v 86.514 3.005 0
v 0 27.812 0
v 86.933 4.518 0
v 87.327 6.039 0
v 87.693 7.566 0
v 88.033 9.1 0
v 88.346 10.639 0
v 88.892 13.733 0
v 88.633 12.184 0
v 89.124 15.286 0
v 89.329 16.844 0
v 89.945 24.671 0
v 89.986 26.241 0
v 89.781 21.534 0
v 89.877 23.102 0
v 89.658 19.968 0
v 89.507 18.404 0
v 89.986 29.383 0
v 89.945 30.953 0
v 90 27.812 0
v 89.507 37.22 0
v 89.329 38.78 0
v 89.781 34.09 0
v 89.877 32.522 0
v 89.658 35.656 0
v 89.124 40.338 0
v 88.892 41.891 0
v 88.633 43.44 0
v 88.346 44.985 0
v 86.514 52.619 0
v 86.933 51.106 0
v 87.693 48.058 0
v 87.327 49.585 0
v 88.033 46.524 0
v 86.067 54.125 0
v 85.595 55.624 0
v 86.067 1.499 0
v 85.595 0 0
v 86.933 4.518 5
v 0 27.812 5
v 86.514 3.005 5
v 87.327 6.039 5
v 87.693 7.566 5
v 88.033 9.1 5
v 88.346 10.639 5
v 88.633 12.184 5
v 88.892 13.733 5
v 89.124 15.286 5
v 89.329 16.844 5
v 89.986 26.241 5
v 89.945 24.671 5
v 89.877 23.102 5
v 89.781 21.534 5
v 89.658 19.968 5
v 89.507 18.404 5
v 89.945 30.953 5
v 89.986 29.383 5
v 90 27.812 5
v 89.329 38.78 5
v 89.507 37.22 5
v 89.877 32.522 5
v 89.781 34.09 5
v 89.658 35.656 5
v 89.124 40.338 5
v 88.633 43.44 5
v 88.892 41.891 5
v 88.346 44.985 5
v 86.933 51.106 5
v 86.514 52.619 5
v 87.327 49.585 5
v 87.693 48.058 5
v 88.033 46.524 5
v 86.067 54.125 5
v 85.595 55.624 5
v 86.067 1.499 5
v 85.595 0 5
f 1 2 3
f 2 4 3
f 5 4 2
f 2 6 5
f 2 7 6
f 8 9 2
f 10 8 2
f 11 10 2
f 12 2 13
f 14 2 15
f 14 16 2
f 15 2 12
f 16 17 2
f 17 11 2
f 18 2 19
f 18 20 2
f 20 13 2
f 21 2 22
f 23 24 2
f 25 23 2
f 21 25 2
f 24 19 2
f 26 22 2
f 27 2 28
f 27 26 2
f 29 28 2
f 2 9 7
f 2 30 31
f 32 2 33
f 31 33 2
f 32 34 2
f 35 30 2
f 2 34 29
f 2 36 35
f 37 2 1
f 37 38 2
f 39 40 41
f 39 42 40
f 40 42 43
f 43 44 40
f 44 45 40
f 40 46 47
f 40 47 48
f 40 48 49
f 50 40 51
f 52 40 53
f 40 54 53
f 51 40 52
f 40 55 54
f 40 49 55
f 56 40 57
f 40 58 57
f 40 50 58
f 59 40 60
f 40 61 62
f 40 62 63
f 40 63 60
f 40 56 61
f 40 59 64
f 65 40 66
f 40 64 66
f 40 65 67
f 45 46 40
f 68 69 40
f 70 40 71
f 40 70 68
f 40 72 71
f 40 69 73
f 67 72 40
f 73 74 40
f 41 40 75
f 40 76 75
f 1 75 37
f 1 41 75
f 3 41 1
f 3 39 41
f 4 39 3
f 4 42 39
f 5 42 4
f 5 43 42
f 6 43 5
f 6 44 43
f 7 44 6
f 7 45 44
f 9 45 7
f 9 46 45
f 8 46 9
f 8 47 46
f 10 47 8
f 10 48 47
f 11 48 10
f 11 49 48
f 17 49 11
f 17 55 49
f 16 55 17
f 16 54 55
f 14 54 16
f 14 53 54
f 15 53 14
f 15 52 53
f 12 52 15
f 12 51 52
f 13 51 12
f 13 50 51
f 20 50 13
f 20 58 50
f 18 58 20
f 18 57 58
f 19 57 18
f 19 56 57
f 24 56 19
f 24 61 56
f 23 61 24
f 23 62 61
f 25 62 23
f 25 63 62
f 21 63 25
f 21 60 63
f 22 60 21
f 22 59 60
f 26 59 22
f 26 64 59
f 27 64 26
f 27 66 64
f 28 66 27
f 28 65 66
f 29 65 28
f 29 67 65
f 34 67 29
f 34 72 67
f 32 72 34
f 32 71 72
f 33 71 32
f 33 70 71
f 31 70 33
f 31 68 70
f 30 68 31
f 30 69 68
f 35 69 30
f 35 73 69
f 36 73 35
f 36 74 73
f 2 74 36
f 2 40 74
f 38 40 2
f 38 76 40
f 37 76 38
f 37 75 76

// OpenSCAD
$fn = 32;

// ----------------------------------------------------------------------
// Arc profile plate: sector, 38 points
// ----------------------------------------------------------------------

// --- parameters (mm) ---
sector_angle = 36;        // sector angle, degrees
sector_r = 90;            // outer radius
arc_step = 1;             // sampling step of the arc, degrees
plate_t = 5;              // plate thickness, Z

bbox_x = 2 * sector_r * sin(sector_angle / 2);  // chord of the sector
bbox_y = sector_r;  // depth of the sector (apex to arc)

profile = [[85.595, 0], [86.067, 1.499], [86.514, 3.005], [86.933, 4.518], [87.327, 6.039], [87.693, 7.566], [88.033, 9.1], [88.346, 10.639], [88.633, 12.184], [88.892, 13.733], [89.124, 15.286], [89.329, 16.844], [89.507, 18.404], [89.658, 19.968], [89.781, 21.534], [89.877, 23.102], [89.945, 24.671], [89.986, 26.241], [90, 27.812], [89.986, 29.383], [89.945, 30.953], [89.877, 32.522], [89.781, 34.09], [89.658, 35.656], [89.507, 37.22], [89.329, 38.78], [89.124, 40.338], [88.892, 41.891], [88.633, 43.44], [88.346, 44.985], [88.033, 46.524], [87.693, 48.058], [87.327, 49.585], [86.933, 51.106], [86.514, 52.619], [86.067, 54.125], [85.595, 55.624], [0, 27.812]];  // primary outline, 38 points, counter clockwise

// --- the one profile operation ---
linear_extrude(height = plate_t) polygon(points = profile);
